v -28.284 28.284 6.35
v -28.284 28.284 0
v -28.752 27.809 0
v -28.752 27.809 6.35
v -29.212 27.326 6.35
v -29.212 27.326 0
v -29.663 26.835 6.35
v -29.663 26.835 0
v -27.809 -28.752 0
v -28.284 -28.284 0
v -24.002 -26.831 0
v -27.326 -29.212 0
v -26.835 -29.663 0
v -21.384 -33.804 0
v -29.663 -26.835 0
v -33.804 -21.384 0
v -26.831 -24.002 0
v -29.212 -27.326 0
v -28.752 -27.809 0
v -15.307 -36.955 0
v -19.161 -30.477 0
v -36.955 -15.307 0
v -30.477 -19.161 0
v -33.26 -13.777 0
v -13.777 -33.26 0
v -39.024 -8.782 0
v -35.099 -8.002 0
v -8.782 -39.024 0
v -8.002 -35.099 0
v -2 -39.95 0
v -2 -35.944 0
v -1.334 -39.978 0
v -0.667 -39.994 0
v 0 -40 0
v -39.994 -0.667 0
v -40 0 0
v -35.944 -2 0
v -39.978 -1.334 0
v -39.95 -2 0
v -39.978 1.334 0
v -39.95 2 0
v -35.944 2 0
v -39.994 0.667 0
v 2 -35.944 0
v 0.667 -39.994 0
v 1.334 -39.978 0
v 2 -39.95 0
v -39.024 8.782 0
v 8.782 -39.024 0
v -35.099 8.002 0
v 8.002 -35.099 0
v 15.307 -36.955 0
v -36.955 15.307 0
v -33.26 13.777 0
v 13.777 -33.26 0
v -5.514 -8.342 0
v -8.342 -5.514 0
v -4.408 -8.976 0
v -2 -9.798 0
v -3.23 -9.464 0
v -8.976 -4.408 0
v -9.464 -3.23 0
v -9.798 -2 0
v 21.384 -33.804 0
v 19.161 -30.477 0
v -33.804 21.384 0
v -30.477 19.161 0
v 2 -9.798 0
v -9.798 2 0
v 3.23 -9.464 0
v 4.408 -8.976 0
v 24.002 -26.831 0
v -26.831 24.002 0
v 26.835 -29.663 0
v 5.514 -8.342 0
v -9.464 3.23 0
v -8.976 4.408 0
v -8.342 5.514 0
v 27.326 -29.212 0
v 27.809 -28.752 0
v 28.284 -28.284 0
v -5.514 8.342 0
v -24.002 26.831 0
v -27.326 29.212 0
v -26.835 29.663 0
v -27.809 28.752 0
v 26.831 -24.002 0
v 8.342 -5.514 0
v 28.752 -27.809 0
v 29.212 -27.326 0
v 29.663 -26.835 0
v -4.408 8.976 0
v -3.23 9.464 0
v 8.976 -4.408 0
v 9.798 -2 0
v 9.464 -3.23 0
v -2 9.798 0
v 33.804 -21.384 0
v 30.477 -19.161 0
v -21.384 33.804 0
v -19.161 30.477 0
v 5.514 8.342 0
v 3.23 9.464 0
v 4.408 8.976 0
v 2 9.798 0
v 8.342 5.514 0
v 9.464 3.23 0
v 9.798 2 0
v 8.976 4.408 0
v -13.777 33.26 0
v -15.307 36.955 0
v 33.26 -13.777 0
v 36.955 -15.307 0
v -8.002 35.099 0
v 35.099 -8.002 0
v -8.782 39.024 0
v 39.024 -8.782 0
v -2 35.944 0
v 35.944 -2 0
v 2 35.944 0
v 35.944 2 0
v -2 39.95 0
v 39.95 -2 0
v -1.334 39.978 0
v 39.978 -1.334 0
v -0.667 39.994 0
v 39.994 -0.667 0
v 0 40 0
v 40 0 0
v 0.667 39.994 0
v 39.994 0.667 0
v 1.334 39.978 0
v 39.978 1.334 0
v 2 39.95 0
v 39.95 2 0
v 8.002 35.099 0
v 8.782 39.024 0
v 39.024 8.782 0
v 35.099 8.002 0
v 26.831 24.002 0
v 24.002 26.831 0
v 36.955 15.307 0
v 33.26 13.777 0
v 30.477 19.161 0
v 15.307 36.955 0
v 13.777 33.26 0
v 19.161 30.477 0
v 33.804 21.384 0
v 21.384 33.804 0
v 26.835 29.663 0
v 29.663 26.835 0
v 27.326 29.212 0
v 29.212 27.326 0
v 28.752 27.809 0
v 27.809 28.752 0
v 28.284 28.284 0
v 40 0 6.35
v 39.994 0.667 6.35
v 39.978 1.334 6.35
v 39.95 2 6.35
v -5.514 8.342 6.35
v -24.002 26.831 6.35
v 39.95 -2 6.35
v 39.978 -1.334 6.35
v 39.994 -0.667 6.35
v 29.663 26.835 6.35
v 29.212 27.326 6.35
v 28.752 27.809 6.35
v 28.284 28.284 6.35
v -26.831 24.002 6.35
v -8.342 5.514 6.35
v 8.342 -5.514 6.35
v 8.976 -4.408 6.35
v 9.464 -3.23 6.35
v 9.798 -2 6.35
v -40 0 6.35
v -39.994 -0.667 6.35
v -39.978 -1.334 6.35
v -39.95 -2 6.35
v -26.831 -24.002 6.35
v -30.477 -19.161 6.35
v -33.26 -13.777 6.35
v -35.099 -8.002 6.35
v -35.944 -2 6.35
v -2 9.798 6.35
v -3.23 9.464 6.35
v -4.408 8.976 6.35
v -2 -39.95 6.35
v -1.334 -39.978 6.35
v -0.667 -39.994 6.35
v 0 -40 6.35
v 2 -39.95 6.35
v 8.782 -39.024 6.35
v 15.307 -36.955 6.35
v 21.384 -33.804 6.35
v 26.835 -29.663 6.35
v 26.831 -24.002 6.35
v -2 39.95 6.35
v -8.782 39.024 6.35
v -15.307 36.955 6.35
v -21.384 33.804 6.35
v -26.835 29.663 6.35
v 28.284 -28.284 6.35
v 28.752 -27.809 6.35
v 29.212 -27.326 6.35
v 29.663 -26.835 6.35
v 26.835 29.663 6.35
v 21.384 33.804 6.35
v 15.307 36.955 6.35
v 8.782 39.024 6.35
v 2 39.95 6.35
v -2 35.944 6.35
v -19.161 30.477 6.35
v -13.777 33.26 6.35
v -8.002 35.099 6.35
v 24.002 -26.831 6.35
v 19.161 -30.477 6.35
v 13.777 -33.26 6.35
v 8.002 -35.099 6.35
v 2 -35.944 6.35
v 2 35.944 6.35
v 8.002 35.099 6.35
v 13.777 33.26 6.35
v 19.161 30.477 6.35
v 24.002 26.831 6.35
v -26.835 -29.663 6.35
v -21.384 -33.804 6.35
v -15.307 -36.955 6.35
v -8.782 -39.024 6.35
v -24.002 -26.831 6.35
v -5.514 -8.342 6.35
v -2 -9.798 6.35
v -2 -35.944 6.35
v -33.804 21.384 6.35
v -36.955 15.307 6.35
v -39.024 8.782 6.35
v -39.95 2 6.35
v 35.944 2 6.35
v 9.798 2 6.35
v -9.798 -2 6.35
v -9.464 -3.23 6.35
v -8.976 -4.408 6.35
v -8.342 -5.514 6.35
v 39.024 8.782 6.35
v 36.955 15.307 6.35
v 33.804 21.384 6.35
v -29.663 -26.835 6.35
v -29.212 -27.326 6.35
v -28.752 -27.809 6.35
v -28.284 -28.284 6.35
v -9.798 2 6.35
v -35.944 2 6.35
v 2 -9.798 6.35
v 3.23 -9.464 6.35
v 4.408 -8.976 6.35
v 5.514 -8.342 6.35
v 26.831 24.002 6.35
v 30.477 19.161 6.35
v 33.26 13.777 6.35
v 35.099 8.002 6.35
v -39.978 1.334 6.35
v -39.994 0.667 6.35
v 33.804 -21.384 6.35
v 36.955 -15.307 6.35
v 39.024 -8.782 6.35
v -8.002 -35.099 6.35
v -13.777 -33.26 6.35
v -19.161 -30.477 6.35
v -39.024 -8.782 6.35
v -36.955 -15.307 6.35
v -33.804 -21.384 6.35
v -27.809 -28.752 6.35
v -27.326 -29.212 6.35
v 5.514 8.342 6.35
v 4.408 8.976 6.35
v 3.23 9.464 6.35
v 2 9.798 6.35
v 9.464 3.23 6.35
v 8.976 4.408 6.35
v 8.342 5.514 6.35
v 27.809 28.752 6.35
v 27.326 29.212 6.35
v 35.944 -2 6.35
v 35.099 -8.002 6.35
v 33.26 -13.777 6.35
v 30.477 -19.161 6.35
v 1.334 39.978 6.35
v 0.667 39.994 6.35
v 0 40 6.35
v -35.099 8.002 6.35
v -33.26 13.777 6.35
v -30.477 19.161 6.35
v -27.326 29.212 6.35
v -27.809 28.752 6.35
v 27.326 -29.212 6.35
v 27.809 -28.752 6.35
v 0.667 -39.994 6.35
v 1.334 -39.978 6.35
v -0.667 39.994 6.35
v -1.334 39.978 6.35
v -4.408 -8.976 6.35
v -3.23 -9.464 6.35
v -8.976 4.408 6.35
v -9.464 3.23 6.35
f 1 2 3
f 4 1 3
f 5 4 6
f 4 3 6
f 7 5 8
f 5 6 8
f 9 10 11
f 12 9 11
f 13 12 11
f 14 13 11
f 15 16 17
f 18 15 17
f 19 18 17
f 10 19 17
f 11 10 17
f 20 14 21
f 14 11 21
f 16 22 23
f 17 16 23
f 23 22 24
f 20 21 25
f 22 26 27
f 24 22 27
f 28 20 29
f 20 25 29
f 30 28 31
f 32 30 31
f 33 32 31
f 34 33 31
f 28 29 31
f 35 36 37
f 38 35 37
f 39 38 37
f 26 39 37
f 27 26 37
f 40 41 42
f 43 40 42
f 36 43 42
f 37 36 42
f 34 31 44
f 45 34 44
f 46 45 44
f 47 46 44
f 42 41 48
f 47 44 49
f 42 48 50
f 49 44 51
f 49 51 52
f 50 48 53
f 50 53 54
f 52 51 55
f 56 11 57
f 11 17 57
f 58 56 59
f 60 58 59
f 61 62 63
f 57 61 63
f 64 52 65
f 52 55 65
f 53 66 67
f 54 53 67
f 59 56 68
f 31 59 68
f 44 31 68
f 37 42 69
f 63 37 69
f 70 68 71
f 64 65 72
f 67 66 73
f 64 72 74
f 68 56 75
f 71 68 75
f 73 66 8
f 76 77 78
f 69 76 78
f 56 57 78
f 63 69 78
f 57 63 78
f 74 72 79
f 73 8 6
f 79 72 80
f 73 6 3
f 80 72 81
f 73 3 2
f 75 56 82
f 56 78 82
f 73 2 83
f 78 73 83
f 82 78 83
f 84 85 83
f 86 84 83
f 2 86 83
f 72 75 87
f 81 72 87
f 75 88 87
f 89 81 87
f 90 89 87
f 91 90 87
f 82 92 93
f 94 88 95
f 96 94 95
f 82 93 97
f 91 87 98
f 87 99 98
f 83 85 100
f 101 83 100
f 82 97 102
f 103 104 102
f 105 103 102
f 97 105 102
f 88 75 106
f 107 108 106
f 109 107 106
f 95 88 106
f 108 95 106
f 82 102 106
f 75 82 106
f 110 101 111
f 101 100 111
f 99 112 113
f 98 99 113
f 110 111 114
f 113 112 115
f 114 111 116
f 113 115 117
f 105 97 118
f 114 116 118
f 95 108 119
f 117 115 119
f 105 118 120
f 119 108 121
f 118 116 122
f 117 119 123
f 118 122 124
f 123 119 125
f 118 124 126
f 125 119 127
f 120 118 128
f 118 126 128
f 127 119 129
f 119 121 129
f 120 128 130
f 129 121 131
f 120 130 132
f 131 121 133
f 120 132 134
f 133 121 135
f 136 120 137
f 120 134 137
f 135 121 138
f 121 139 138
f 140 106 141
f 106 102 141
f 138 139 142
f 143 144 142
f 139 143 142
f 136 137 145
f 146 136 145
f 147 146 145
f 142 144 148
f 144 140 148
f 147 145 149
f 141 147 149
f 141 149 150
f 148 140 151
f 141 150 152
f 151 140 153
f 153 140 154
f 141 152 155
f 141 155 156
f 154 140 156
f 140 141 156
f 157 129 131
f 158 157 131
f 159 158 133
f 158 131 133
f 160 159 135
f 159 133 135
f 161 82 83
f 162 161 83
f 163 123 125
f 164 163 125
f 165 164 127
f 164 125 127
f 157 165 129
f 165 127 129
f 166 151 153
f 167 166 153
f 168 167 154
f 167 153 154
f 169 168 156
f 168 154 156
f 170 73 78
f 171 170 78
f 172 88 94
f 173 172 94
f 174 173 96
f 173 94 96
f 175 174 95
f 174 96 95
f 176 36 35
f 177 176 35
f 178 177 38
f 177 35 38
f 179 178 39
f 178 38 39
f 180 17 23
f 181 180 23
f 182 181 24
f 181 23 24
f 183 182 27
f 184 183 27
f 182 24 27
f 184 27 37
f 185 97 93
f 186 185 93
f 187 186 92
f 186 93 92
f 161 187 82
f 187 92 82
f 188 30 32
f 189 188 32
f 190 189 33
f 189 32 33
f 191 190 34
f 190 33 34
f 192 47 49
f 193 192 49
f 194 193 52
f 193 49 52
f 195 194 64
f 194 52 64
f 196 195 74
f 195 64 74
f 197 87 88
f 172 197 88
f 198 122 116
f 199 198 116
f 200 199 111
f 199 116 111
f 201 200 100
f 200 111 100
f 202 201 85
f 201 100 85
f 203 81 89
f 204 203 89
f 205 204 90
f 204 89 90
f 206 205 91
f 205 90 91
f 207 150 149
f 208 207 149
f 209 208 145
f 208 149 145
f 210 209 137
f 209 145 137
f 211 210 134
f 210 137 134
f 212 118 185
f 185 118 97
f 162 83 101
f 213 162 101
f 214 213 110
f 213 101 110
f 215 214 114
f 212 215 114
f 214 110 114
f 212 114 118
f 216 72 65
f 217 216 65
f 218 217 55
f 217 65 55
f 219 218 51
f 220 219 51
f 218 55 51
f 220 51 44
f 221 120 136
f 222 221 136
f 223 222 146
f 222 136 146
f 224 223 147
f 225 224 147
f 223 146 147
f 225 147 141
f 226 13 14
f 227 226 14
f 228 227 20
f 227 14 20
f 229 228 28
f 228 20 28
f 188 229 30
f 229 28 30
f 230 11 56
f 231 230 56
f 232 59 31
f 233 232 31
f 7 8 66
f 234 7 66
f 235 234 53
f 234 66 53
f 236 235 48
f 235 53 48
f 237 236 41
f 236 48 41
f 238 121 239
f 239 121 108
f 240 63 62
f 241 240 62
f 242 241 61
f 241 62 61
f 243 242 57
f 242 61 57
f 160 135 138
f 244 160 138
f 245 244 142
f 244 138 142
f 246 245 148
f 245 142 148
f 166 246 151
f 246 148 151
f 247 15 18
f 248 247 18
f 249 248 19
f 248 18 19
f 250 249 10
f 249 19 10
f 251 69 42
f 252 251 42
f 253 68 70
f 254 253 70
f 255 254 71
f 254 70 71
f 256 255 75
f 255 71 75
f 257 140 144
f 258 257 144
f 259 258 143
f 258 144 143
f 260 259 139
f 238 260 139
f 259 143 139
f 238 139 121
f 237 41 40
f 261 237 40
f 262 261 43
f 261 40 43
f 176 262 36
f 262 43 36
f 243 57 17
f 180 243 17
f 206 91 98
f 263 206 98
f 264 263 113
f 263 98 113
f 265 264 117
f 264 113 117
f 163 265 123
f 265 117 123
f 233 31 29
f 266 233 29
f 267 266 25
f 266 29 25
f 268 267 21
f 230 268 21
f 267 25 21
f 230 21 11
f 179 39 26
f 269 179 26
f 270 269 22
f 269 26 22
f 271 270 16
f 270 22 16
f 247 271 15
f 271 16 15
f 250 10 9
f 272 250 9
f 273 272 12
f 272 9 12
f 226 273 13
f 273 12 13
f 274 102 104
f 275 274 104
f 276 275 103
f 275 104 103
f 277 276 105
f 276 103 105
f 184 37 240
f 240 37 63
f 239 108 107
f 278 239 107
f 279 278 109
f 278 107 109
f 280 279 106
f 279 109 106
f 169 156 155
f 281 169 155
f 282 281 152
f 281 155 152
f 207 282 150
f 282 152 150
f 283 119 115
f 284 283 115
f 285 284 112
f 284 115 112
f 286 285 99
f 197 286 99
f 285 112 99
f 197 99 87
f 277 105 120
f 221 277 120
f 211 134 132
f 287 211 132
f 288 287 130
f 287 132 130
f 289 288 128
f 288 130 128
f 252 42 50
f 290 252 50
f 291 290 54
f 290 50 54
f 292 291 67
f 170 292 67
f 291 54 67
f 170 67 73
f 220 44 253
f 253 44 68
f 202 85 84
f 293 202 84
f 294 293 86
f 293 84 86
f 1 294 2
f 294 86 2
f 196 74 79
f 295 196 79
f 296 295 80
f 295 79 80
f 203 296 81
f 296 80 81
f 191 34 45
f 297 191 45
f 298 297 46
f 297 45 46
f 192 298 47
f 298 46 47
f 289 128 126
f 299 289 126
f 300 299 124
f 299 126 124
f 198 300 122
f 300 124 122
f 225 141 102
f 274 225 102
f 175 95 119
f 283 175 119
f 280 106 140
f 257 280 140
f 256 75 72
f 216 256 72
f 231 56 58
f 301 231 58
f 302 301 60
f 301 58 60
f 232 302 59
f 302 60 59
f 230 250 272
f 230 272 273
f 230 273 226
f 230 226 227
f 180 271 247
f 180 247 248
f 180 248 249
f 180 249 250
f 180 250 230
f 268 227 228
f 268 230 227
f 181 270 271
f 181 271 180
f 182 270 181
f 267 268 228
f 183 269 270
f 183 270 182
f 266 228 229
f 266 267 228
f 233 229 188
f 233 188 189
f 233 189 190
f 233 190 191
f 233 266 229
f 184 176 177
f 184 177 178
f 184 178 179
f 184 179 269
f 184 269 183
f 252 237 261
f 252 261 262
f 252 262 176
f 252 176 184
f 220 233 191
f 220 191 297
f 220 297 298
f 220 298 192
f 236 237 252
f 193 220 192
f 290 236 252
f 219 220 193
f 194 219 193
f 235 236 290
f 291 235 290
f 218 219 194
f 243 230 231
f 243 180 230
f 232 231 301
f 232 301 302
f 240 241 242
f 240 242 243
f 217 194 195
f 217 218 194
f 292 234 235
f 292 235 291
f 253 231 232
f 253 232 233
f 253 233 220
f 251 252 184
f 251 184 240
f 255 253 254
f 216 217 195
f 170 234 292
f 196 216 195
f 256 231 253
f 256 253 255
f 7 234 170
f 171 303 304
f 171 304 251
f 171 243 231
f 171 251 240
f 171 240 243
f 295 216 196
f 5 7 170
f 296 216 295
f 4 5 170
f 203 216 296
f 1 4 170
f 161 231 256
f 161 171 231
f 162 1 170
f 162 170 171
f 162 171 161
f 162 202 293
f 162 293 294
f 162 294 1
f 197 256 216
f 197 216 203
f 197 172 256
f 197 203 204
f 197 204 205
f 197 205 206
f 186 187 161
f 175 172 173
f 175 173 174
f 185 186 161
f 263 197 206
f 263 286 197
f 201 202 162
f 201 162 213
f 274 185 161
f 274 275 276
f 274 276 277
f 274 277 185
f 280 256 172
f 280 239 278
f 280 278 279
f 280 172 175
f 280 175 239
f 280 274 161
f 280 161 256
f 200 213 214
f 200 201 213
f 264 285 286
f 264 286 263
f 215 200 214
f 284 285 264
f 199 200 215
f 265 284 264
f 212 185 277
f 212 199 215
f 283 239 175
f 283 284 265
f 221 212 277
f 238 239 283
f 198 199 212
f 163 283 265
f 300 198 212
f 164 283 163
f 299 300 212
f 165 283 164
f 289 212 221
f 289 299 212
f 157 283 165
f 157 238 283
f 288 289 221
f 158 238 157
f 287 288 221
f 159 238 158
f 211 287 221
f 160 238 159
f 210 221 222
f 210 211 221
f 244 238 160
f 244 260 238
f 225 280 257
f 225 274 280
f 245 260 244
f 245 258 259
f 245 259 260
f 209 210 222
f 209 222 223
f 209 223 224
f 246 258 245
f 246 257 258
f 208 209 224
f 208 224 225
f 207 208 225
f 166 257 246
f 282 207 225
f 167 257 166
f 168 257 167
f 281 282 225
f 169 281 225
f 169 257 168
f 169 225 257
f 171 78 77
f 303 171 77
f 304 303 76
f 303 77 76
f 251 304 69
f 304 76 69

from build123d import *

# Parameters (mm, degrees)
F1_DEPTH = 6.35


with BuildPart() as f1:
    # F0 (on Top) → F1 (new body)
    with BuildSketch(Plane.XY):
        with BuildLine():
            ThreePointArc((-24.0023164919, 26.8307436167), (-13.7766035651, 33.2596631704), (-2, 35.9444015112))
            Line((-2, 35.9444015112), (-2, 39.9499687109))
            ThreePointArc((-2, 39.9499687109), (-15.3073372946, 36.9551813005), (-26.8346802213, 29.663107346))
            Line((-26.8346802213, 29.663107346), (-24.0023164919, 26.8307436167))
        make_face()
        with BuildLine():
            Line((2, 35.9444015112), (2, 39.9499687109))
            ThreePointArc((2, 39.9499687109), (1.0003128423, 39.9874902215), (0, 40))
            ThreePointArc((0, 40), (-1.0003128423, 39.9874902215), (-2, 39.9499687109))
            Line((-2, 39.9499687109), (-2, 35.9444015112))
            ThreePointArc((-2, 35.9444015112), (0, 36), (2, 35.9444015112))
        make_face()
        with BuildLine():
            Line((24.0023164919, 26.8307436167), (26.8346802213, 29.663107346))
            ThreePointArc((26.8346802213, 29.663107346), (15.3073372946, 36.9551813005), (2, 39.9499687109))
            Line((2, 39.9499687109), (2, 35.9444015112))
            ThreePointArc((2, 35.9444015112), (13.7766035651, 33.2596631704), (24.0023164919, 26.8307436167))
        make_face()
        with BuildLine():
            Line((26.8307436167, 24.0023164919), (29.663107346, 26.8346802213))
            ThreePointArc((29.663107346, 26.8346802213), (28.9827534924, 27.5680975042), (28.2842712475, 28.2842712475))
            ThreePointArc((28.2842712475, 28.2842712475), (27.5680975042, 28.9827534924), (26.8346802213, 29.663107346))
            Line((26.8346802213, 29.663107346), (24.0023164919, 26.8307436167))
            ThreePointArc((24.0023164919, 26.8307436167), (25.4558441227, 25.4558441227), (26.8307436167, 24.0023164919))
        make_face()
        with BuildLine():
            Line((35.9444015112, 2), (39.9499687109, 2))
            ThreePointArc((39.9499687109, 2), (36.9551813005, 15.3073372946), (29.663107346, 26.8346802213))
            Line((29.663107346, 26.8346802213), (26.8307436167, 24.0023164919))
            ThreePointArc((26.8307436167, 24.0023164919), (33.2596631704, 13.7766035651), (35.9444015112, 2))
        make_face()
        with BuildLine():
            ThreePointArc((39.9499687109, -2), (39.9874902215, -1.0003128423), (40, 0))
            ThreePointArc((40, 0), (39.9874902215, 1.0003128423), (39.9499687109, 2))
            Line((39.9499687109, 2), (35.9444015112, 2))
            ThreePointArc((35.9444015112, 2), (35.9860976934, 1.0003863244), (36, 0))
            ThreePointArc((36, 0), (35.9860976934, -1.0003863244), (35.9444015112, -2))
            Line((35.9444015112, -2), (39.9499687109, -2))
        make_face()
        with BuildLine():
            ThreePointArc((29.663107346, -26.8346802213), (36.9551813005, -15.3073372946), (39.9499687109, -2))
            Line((39.9499687109, -2), (35.9444015112, -2))
            ThreePointArc((35.9444015112, -2), (33.2596631704, -13.7766035651), (26.8307436167, -24.0023164919))
            Line((26.8307436167, -24.0023164919), (29.663107346, -26.8346802213))
        make_face()
        with BuildLine():
            ThreePointArc((28.2842712475, -28.2842712475), (28.9827534924, -27.5680975042), (29.663107346, -26.8346802213))
            Line((29.663107346, -26.8346802213), (26.8307436167, -24.0023164919))
            ThreePointArc((26.8307436167, -24.0023164919), (25.4558441227, -25.4558441227), (24.0023164919, -26.8307436167))
            Line((24.0023164919, -26.8307436167), (26.8346802213, -29.663107346))
            ThreePointArc((26.8346802213, -29.663107346), (27.5680975042, -28.9827534924), (28.2842712475, -28.2842712475))
        make_face()
        with BuildLine():
            ThreePointArc((2, -39.9499687109), (15.3073372946, -36.9551813005), (26.8346802213, -29.663107346))
            Line((26.8346802213, -29.663107346), (24.0023164919, -26.8307436167))
            ThreePointArc((24.0023164919, -26.8307436167), (13.7766035651, -33.2596631704), (2, -35.9444015112))
            Line((2, -35.9444015112), (2, -39.9499687109))
        make_face()
        with BuildLine():
            ThreePointArc((0, -40), (1.0003128423, -39.9874902215), (2, -39.9499687109))
            Line((2, -39.9499687109), (2, -35.9444015112))
            ThreePointArc((2, -35.9444015112), (0, -36), (-2, -35.9444015112))
            Line((-2, -35.9444015112), (-2, -39.9499687109))
            ThreePointArc((-2, -39.9499687109), (-1.0003128423, -39.9874902215), (0, -40))
        make_face()
        with BuildLine():
            Line((-2, -39.9499687109), (-2, -35.9444015112))
            ThreePointArc((-2, -35.9444015112), (-13.7766035651, -33.2596631704), (-24.0023164919, -26.8307436167))
            Line((-24.0023164919, -26.8307436167), (-26.8346802213, -29.663107346))
            ThreePointArc((-26.8346802213, -29.663107346), (-15.3073372946, -36.9551813005), (-2, -39.9499687109))
        make_face()
        with BuildLine():
            Line((-26.8346802213, -29.663107346), (-24.0023164919, -26.8307436167))
            ThreePointArc((-24.0023164919, -26.8307436167), (-25.4558441227, -25.4558441227), (-26.8307436167, -24.0023164919))
            Line((-26.8307436167, -24.0023164919), (-29.663107346, -26.8346802213))
            ThreePointArc((-29.663107346, -26.8346802213), (-28.9827534924, -27.5680975042), (-28.2842712475, -28.2842712475))
            ThreePointArc((-28.2842712475, -28.2842712475), (-27.5680975042, -28.9827534924), (-26.8346802213, -29.663107346))
        make_face()
        with BuildLine():
            Line((-29.663107346, -26.8346802213), (-26.8307436167, -24.0023164919))
            ThreePointArc((-26.8307436167, -24.0023164919), (-33.2596631704, -13.7766035651), (-35.9444015112, -2))
            Line((-35.9444015112, -2), (-39.9499687109, -2))
            ThreePointArc((-39.9499687109, -2), (-36.9551813005, -15.3073372946), (-29.663107346, -26.8346802213))
        make_face()
        with BuildLine():
            ThreePointArc((-35.9444015112, -2), (-36, 0), (-35.9444015112, 2))
            Line((-35.9444015112, 2), (-39.9499687109, 2))
            ThreePointArc((-39.9499687109, 2), (-39.9874902215, 1.0003128423), (-40, 0))
            ThreePointArc((-40, 0), (-39.9874902215, -1.0003128423), (-39.9499687109, -2))
            Line((-39.9499687109, -2), (-35.9444015112, -2))
        make_face()
        with BuildLine():
            ThreePointArc((-35.9444015112, 2), (-33.2596631704, 13.7766035651), (-26.8307436167, 24.0023164919))
            Line((-26.8307436167, 24.0023164919), (-29.663107346, 26.8346802213))
            ThreePointArc((-29.663107346, 26.8346802213), (-36.9551813005, 15.3073372946), (-39.9499687109, 2))
            Line((-39.9499687109, 2), (-35.9444015112, 2))
        make_face()
        with BuildLine():
            ThreePointArc((-26.8307436167, 24.0023164919), (-25.4558441227, 25.4558441227), (-24.0023164919, 26.8307436167))
            Line((-24.0023164919, 26.8307436167), (-26.8346802213, 29.663107346))
            ThreePointArc((-26.8346802213, 29.663107346), (-27.5680974995, 28.9827534968), (-28.2842712383, 28.2842712566))
            ThreePointArc((-28.2842712383, 28.2842712566), (-28.9827534879, 27.5680975089), (-29.663107346, 26.8346802213))
            Line((-29.663107346, 26.8346802213), (-26.8307436167, 24.0023164919))
        make_face()
        with BuildLine():
            Line((2, 9.7979589711), (2, 35.9444015112))
            ThreePointArc((2, 35.9444015112), (0, 36), (-2, 35.9444015112))
            Line((-2, 35.9444015112), (-2, 9.7979589711))
            ThreePointArc((-2, 9.7979589711), (0, 10), (2, 9.7979589711))
        make_face()
        with BuildLine():
            Line((8.3424167926, 5.5139896679), (26.8307436167, 24.0023164919))
            ThreePointArc((26.8307436167, 24.0023164919), (25.4558441227, 25.4558441227), (24.0023164919, 26.8307436167))
            Line((24.0023164919, 26.8307436167), (5.5139896679, 8.3424167926))
            ThreePointArc((5.5139896679, 8.3424167926), (7.0710678119, 7.0710678119), (8.3424167926, 5.5139896679))
        make_face()
        with BuildLine():
            ThreePointArc((36, 0), (35.9860976934, 1.0003863244), (35.9444015112, 2))
            Line((35.9444015112, 2), (9.7979589711, 2))
            ThreePointArc((9.7979589711, 2), (9.9493615301, 1.0050896201), (10, 0))
            ThreePointArc((10, 0), (9.9493615301, -1.0050896201), (9.7979589711, -2))
            Line((9.7979589711, -2), (35.9444015112, -2))
            ThreePointArc((35.9444015112, -2), (35.9860976934, -1.0003863244), (36, 0))
        make_face()
        with BuildLine():
            Line((-5.5139896679, 8.3424167926), (-24.0023164919, 26.8307436167))
            ThreePointArc((-24.0023164919, 26.8307436167), (-25.4558441227, 25.4558441227), (-26.8307436167, 24.0023164919))
            Line((-26.8307436167, 24.0023164919), (-8.3424167926, 5.5139896679))
            ThreePointArc((-8.3424167926, 5.5139896679), (-7.0710678119, 7.0710678119), (-5.5139896679, 8.3424167926))
        make_face()
        with BuildLine():
            Line((-9.7979589711, 2), (-35.9444015112, 2))
            ThreePointArc((-35.9444015112, 2), (-36, 0), (-35.9444015112, -2))
            Line((-35.9444015112, -2), (-9.7979589711, -2))
            ThreePointArc((-9.7979589711, -2), (-10, 0), (-9.7979589711, 2))
        make_face()
        with BuildLine():
            ThreePointArc((-26.8307436167, -24.0023164919), (-25.4558441227, -25.4558441227), (-24.0023164919, -26.8307436167))
            Line((-24.0023164919, -26.8307436167), (-5.5139896679, -8.3424167926))
            ThreePointArc((-5.5139896679, -8.3424167926), (-7.0710678119, -7.0710678119), (-8.3424167926, -5.5139896679))
            Line((-8.3424167926, -5.5139896679), (-26.8307436167, -24.0023164919))
        make_face()
        with BuildLine():
            ThreePointArc((-2, -35.9444015112), (0, -36), (2, -35.9444015112))
            Line((2, -35.9444015112), (2, -9.7979589711))
            ThreePointArc((2, -9.7979589711), (0, -10), (-2, -9.7979589711))
            Line((-2, -9.7979589711), (-2, -35.9444015112))
        make_face()
        with BuildLine():
            ThreePointArc((24.0023164919, -26.8307436167), (25.4558441227, -25.4558441227), (26.8307436167, -24.0023164919))
            Line((26.8307436167, -24.0023164919), (8.3424167926, -5.5139896679))
            ThreePointArc((8.3424167926, -5.5139896679), (7.0710678119, -7.0710678119), (5.5139896679, -8.3424167926))
            Line((5.5139896679, -8.3424167926), (24.0023164919, -26.8307436167))
        make_face()
        with BuildLine():
            ThreePointArc((10, 0), (9.9493615301, 1.0050896201), (9.7979589711, 2))
            Line((9.7979589711, 2), (4.8284271247, 2))
            Line((4.8284271247, 2), (2.8284271247, 0))
            Line((2.8284271247, 0), (4.8284271247, -2))
            Line((4.8284271247, -2), (9.7979589711, -2))
            ThreePointArc((9.7979589711, -2), (9.9493615301, -1.0050896201), (10, 0))
        make_face()
        with BuildLine():
            Line((4.8284271247, 2), (9.7979589711, 2))
            ThreePointArc((9.7979589711, 2), (9.2387953251, 3.8268343237), (8.3424167926, 5.5139896679))
            Line((8.3424167926, 5.5139896679), (4.8284271247, 2))
        make_face()
        with BuildLine():
            Line((4.8284271247, 2), (8.3424167926, 5.5139896679))
            ThreePointArc((8.3424167926, 5.5139896679), (7.0710678119, 7.0710678119), (5.5139896679, 8.3424167926))
            Line((5.5139896679, 8.3424167926), (2, 4.8284271247))
            Line((2, 4.8284271247), (2, 2))
            Line((2, 2), (4.8284271247, 2))
        make_face()
        with BuildLine():
            Line((2, 4.8284271247), (5.5139896679, 8.3424167926))
            ThreePointArc((5.5139896679, 8.3424167926), (3.8268343237, 9.2387953251), (2, 9.7979589711))
            Line((2, 9.7979589711), (2, 4.8284271247))
        make_face()
        with BuildLine():
            Line((2, 4.8284271247), (2, 9.7979589711))
            ThreePointArc((2, 9.7979589711), (0, 10), (-2, 9.7979589711))
            Line((-2, 9.7979589711), (-2, 4.8284271247))
            Line((-2, 4.8284271247), (0, 2.8284271247))
            Line((0, 2.8284271247), (2, 4.8284271247))
        make_face()
        with BuildLine():
            Line((-2, 4.8284271247), (-2, 9.7979589711))
            ThreePointArc((-2, 9.7979589711), (-3.8268343237, 9.2387953251), (-5.5139896679, 8.3424167926))
            Line((-5.5139896679, 8.3424167926), (-2, 4.8284271247))
        make_face()
        with BuildLine():
            Line((-2, 4.8284271247), (-5.5139896679, 8.3424167926))
            ThreePointArc((-5.5139896679, 8.3424167926), (-7.0710678119, 7.0710678119), (-8.3424167926, 5.5139896679))
            Line((-8.3424167926, 5.5139896679), (-4.8284271247, 2))
            Line((-4.8284271247, 2), (-2, 2))
            Line((-2, 2), (-2, 4.8284271247))
        make_face()
        with BuildLine():
            ThreePointArc((2, -9.7979589711), (3.8268343237, -9.2387953251), (5.5139896679, -8.3424167926))
            Line((5.5139896679, -8.3424167926), (2, -4.8284271247))
            Line((2, -4.8284271247), (2, -9.7979589711))
        make_face()
        with BuildLine():
            ThreePointArc((5.5139896679, -8.3424167926), (7.0710678119, -7.0710678119), (8.3424167926, -5.5139896679))
            Line((8.3424167926, -5.5139896679), (4.8284271247, -2))
            Line((4.8284271247, -2), (2, -2))
            Line((2, -2), (2, -4.8284271247))
            Line((2, -4.8284271247), (5.5139896679, -8.3424167926))
        make_face()
        with BuildLine():
            ThreePointArc((8.3424167926, -5.5139896679), (9.2387953251, -3.8268343237), (9.7979589711, -2))
            Line((9.7979589711, -2), (4.8284271247, -2))
            Line((4.8284271247, -2), (8.3424167926, -5.5139896679))
        make_face()
        Polygon((2, -2), (4.8284271247, -2), (2.8284271247, 0), (2, -0.8284271247), align=None)
        Polygon((2, -4.8284271247), (2, -2), (0.8284271247, -2), (0, -2.8284271247), align=None)
        with BuildLine():
            ThreePointArc((-5.5139896679, -8.3424167926), (-3.8268343237, -9.2387953251), (-2, -9.7979589711))
            Line((-2, -9.7979589711), (-2, -4.8284271247))
            Line((-2, -4.8284271247), (-5.5139896679, -8.3424167926))
        make_face()
        with BuildLine():
            ThreePointArc((-2, -9.7979589711), (0, -10), (2, -9.7979589711))
            Line((2, -9.7979589711), (2, -4.8284271247))
            Line((2, -4.8284271247), (0, -2.8284271247))
            Line((0, -2.8284271247), (-2, -4.8284271247))
            Line((-2, -4.8284271247), (-2, -9.7979589711))
        make_face()
        with BuildLine():
            ThreePointArc((-8.3424167926, -5.5139896679), (-7.0710678119, -7.0710678119), (-5.5139896679, -8.3424167926))
            Line((-5.5139896679, -8.3424167926), (-2, -4.8284271247))
            Line((-2, -4.8284271247), (-2, -2))
            Line((-2, -2), (-4.8284271247, -2))
            Line((-4.8284271247, -2), (-8.3424167926, -5.5139896679))
        make_face()
        with BuildLine():
            ThreePointArc((-9.7979589711, -2), (-9.2387953251, -3.8268343237), (-8.3424167926, -5.5139896679))
            Line((-8.3424167926, -5.5139896679), (-4.8284271247, -2))
            Line((-4.8284271247, -2), (-9.7979589711, -2))
        make_face()
        with BuildLine():
            Line((-2.8284271247, 0), (-4.8284271247, 2))
            Line((-4.8284271247, 2), (-9.7979589711, 2))
            ThreePointArc((-9.7979589711, 2), (-10, 0), (-9.7979589711, -2))
            Line((-9.7979589711, -2), (-4.8284271247, -2))
            Line((-4.8284271247, -2), (-2.8284271247, 0))
        make_face()
        with BuildLine():
            Line((-4.8284271247, 2), (-8.3424167926, 5.5139896679))
            ThreePointArc((-8.3424167926, 5.5139896679), (-9.2387953251, 3.8268343237), (-9.7979589711, 2))
            Line((-9.7979589711, 2), (-4.8284271247, 2))
        make_face()
        Polygon((-4.8284271247, -2), (-2, -2), (-2, -0.8284271247), (-2.8284271247, 0), align=None)
        Polygon((-2, -4.8284271247), (0, -2.8284271247), (-0.8284271247, -2), (-2, -2), align=None)
        Polygon((0, -2.8284271247), (0.8284271247, -2), (-0.8284271247, -2), align=None)
        Polygon((0.8284271247, -2), (2, -2), (2, -0.8284271247), align=None)
        Polygon((2, -0.8284271247), (2.8284271247, 0), (2, 0.8284271247), align=None)
        Polygon((2.8284271247, 0), (4.8284271247, 2), (2, 2), (2, 0.8284271247), align=None)
        Polygon((0.8284271247, 2), (2, 2), (2, 4.8284271247), (0, 2.8284271247), align=None)
        Polygon((2, 0.8284271247), (2, 2), (0.8284271247, 2), align=None)
        Polygon((-0.8284271247, 2), (0, 2.8284271247), (-2, 4.8284271247), (-2, 2), align=None)
        Polygon((-0.8284271247, 2), (0.8284271247, 2), (0, 2.8284271247), align=None)
        Polygon((-2, 0.8284271247), (-2, 2), (-4.8284271247, 2), (-2.8284271247, 0), align=None)
        Polygon((2, -0.8284271247), (2, 0.8284271247), (0.8284271247, 2), (-0.8284271247, 2), (-2, 0.8284271247), (-2, -0.8284271247), (-0.8284271247, -2), (0.8284271247, -2), align=None)
        Polygon((-2, 0.8284271247), (-0.8284271247, 2), (-2, 2), align=None)
        Polygon((-2, -0.8284271247), (-2, 0.8284271247), (-2.8284271247, 0), align=None)
        Polygon((-2, -2), (-0.8284271247, -2), (-2, -0.8284271247), align=None)
    extrude(amount=F1_DEPTH)


solid = f1.part
